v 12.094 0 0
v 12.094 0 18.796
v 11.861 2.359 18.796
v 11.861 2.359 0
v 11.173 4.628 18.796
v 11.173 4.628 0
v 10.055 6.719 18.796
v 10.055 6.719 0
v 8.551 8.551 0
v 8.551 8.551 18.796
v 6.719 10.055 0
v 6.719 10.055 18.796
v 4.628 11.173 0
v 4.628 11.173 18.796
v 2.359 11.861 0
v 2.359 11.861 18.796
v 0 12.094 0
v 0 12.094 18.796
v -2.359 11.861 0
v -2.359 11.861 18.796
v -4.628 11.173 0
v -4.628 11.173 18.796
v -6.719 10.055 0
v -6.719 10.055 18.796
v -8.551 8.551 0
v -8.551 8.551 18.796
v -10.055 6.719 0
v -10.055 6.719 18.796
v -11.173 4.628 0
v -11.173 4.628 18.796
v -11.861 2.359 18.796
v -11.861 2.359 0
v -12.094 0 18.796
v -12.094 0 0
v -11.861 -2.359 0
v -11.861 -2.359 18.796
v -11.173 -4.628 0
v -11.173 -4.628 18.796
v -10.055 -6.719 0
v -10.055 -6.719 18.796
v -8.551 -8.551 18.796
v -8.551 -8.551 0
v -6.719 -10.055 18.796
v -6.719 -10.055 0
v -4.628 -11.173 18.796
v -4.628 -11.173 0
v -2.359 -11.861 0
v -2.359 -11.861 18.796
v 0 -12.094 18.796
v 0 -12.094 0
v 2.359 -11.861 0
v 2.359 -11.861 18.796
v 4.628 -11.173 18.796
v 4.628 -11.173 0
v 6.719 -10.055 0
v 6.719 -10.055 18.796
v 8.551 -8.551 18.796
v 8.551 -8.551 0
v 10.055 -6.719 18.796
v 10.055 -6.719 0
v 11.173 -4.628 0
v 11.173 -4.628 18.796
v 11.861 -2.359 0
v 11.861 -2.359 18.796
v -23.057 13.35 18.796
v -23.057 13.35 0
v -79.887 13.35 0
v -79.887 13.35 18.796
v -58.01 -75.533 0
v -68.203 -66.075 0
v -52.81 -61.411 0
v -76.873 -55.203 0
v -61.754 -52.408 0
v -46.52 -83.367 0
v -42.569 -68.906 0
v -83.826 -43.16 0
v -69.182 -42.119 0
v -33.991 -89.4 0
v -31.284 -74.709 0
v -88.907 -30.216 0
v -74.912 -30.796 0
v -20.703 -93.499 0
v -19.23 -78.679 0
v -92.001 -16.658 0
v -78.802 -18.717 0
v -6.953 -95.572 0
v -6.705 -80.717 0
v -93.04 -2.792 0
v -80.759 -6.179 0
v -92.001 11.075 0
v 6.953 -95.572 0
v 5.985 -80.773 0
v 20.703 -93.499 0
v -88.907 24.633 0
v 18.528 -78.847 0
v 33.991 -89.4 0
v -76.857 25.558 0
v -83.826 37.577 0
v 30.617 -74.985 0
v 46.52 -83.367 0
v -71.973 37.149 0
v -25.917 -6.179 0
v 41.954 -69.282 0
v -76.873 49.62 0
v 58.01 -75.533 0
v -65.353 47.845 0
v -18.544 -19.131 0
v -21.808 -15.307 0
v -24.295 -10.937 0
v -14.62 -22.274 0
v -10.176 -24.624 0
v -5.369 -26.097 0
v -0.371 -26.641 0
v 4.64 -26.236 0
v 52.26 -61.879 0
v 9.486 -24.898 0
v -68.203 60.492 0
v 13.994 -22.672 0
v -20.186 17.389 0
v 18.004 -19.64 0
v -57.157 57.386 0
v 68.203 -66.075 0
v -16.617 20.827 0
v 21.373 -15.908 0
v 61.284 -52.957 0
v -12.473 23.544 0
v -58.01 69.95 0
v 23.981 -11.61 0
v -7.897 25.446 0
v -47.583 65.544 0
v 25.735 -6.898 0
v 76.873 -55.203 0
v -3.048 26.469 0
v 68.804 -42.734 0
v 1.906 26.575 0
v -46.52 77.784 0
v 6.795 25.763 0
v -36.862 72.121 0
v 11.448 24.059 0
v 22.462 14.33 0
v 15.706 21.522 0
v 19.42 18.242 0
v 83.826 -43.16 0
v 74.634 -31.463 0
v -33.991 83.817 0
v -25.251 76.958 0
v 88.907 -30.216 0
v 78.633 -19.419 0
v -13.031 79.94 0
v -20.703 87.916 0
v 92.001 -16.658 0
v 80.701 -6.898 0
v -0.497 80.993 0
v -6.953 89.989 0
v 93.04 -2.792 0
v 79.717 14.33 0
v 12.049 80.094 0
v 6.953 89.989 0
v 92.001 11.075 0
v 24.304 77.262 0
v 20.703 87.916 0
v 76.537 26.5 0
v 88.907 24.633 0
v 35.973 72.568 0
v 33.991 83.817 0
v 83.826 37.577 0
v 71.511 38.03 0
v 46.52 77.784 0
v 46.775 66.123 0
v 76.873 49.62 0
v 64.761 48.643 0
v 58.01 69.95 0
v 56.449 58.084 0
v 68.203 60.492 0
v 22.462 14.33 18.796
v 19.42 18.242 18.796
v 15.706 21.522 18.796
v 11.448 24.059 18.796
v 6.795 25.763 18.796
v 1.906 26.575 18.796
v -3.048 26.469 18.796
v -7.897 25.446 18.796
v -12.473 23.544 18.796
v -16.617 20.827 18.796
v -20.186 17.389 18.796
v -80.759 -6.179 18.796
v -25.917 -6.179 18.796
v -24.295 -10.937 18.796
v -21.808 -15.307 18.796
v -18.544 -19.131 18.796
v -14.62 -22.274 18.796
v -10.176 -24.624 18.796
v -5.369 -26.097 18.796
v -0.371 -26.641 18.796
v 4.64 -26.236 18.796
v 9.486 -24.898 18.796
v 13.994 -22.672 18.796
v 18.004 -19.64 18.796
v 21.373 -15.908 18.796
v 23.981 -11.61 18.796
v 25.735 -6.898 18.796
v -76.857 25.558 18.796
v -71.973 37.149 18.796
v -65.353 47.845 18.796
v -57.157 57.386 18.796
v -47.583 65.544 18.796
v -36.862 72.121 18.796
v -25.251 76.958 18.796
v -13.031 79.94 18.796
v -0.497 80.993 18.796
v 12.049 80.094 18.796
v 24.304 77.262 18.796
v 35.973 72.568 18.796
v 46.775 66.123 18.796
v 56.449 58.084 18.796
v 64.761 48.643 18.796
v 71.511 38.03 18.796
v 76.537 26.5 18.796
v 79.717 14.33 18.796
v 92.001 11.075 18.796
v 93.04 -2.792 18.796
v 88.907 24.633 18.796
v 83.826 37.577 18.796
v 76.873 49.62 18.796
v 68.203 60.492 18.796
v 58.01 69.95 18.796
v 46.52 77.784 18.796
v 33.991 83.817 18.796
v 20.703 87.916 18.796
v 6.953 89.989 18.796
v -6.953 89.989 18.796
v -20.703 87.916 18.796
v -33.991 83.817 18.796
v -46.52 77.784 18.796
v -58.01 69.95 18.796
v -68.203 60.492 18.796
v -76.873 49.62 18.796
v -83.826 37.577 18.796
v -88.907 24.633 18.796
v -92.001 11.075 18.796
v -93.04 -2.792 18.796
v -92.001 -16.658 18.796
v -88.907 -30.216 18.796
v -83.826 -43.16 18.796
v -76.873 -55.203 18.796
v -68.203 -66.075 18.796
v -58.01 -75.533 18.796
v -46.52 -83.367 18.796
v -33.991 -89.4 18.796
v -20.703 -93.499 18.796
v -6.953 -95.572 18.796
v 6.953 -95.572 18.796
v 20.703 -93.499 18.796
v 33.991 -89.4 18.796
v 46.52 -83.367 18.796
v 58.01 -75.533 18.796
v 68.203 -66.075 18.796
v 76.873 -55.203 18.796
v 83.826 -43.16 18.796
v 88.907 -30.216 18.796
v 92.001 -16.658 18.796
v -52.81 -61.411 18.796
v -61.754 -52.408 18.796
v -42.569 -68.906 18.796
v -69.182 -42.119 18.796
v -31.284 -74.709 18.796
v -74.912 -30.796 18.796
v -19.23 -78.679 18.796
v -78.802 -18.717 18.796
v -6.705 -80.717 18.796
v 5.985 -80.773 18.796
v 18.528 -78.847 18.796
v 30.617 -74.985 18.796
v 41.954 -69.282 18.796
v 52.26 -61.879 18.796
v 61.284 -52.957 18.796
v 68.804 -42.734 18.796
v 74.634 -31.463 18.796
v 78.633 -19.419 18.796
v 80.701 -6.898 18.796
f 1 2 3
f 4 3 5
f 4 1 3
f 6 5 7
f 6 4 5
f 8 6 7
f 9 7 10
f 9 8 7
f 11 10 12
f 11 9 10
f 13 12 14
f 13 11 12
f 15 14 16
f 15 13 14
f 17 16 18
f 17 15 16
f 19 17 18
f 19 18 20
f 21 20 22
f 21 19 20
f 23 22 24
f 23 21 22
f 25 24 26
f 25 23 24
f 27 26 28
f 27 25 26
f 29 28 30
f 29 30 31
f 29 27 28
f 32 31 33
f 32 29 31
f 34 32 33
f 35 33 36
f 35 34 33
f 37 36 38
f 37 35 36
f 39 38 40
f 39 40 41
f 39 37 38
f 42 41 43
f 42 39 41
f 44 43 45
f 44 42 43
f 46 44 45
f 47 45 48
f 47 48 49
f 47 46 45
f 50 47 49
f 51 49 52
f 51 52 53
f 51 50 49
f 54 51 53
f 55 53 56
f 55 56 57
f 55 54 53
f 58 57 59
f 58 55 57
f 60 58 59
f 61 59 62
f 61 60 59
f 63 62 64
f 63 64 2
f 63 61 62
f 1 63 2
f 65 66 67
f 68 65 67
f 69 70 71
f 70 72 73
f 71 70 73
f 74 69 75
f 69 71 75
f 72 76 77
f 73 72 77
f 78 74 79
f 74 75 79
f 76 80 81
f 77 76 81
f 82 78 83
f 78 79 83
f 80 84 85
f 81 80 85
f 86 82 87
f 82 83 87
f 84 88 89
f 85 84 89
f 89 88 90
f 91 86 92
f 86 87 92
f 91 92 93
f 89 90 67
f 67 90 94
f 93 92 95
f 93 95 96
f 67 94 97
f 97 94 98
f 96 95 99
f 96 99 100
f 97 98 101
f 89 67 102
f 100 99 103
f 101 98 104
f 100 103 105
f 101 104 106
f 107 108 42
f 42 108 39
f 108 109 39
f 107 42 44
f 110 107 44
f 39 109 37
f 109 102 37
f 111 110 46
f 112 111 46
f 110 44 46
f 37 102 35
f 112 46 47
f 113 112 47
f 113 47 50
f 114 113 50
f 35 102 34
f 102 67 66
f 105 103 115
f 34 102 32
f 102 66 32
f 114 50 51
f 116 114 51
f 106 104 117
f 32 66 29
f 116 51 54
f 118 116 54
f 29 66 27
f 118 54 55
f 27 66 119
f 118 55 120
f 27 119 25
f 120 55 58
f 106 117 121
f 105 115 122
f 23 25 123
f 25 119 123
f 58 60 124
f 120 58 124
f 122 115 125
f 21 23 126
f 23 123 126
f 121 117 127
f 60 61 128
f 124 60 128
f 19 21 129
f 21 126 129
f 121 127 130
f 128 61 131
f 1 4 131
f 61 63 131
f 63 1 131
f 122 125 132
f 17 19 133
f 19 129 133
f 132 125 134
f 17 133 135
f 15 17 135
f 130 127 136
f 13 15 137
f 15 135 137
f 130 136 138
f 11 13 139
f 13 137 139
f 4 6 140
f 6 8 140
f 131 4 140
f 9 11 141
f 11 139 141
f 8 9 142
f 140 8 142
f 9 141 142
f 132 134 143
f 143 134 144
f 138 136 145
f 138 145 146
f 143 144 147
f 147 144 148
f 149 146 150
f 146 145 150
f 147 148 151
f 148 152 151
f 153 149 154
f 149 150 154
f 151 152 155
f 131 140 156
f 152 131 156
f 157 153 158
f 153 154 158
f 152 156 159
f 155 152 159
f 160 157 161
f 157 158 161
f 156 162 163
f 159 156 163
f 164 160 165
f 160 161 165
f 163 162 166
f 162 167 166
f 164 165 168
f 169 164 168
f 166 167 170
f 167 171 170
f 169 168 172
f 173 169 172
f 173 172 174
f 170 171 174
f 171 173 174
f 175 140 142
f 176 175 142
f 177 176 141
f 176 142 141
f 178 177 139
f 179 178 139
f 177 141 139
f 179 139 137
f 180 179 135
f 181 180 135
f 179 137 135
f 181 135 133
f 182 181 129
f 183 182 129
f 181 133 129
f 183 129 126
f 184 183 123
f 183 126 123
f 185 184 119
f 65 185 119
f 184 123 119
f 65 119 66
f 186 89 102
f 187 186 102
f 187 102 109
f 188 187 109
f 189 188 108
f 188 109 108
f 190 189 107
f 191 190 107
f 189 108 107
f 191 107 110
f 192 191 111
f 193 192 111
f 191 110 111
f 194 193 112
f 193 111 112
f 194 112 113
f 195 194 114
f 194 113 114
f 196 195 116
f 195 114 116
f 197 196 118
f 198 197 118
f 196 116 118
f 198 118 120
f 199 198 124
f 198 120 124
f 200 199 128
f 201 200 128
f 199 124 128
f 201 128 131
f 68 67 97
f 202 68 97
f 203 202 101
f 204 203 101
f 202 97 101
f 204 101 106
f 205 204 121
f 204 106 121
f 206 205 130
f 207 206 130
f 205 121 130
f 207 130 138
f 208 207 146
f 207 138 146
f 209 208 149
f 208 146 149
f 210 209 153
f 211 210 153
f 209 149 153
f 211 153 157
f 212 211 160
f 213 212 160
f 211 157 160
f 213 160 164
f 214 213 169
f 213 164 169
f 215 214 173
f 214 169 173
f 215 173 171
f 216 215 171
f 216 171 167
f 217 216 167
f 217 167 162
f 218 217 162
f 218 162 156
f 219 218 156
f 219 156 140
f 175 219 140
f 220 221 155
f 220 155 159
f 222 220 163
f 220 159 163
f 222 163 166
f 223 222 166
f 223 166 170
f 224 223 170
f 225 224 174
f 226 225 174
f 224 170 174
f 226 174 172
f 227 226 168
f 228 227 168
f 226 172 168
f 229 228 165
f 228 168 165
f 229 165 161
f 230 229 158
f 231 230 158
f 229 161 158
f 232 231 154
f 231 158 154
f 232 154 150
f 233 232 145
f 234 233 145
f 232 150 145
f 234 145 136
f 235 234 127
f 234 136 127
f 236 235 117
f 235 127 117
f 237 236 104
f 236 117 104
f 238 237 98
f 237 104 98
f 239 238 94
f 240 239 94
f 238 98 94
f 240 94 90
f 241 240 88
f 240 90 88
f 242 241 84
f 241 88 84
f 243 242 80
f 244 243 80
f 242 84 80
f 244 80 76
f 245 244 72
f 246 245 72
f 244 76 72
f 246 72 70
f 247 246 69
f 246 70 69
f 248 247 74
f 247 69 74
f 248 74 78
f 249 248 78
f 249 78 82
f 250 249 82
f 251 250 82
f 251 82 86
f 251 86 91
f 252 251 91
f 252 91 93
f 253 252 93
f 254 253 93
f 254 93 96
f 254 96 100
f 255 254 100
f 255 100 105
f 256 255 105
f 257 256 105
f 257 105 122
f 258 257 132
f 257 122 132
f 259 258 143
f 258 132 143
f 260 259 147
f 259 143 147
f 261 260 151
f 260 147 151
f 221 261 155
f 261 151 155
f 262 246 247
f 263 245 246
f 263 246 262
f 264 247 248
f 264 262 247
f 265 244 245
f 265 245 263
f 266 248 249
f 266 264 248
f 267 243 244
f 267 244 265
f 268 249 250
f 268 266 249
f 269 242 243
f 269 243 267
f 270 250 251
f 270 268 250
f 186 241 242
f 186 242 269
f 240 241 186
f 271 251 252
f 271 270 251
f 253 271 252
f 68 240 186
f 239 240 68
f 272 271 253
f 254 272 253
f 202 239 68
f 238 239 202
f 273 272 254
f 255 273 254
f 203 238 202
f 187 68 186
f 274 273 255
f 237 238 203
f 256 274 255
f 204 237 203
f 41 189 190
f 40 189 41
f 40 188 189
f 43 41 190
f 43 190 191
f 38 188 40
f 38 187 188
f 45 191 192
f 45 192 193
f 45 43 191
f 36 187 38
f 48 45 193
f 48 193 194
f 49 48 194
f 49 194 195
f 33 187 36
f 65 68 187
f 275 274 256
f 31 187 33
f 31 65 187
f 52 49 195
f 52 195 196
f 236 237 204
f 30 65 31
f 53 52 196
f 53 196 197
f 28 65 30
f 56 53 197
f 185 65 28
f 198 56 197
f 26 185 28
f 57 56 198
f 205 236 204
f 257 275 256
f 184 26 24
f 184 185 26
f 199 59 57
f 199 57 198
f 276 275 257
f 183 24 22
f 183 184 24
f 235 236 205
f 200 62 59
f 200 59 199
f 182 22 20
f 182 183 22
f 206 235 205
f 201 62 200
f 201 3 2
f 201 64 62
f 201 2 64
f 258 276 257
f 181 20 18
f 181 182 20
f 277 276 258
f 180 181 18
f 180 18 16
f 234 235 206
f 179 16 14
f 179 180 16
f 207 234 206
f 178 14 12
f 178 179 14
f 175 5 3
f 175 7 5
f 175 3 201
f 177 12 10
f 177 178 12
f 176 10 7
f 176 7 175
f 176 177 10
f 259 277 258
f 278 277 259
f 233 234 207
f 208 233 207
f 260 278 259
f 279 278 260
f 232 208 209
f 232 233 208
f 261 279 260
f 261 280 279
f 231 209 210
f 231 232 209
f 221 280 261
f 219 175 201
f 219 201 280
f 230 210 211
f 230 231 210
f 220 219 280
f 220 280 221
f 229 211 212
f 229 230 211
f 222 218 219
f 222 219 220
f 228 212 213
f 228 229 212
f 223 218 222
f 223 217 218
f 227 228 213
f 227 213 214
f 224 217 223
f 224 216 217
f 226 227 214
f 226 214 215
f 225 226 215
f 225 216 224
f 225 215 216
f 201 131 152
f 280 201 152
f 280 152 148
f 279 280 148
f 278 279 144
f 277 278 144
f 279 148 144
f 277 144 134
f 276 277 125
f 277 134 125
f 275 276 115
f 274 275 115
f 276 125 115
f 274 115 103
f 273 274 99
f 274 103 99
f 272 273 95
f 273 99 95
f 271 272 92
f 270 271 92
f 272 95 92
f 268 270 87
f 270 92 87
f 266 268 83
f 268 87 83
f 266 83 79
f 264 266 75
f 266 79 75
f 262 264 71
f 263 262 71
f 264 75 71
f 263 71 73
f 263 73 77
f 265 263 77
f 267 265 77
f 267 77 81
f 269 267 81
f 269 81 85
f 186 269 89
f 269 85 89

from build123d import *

# Parameters (mm, degrees)
F0_R     = 93.0402692982
F0_R_2   = 20.2691960741
F0_R_3   = 12.0935741479
F1_DEPTH = 18.796


with BuildPart() as f1:
    # F0 (on Top) → F1 (new body)
    with BuildSketch(Plane.XY):
        with Locations((0, -2.7915611863)):
            Circle(F0_R)
        with BuildLine():
            ThreePointArc((-79.8869530557, 13.3503982046), (-0.497116202, 80.9932792041), (79.7170577495, 14.3300071359))
            ThreePointArc((79.7170577495, 14.3300071359), (80.674735607, 7.1934300229), (80.9948047763, 0))
            ThreePointArc((80.9948047763, 0), (80.9212005693, -3.4522020762), (80.7005217242, -6.8981297599))
            ThreePointArc((80.7005217242, -6.8981297599), (-0.3608473211, -80.9940009504), (-80.7587824796, -6.1787905904))
            ThreePointArc((-80.7587824796, -6.1787905904), (-80.9142162427, 3.6122030091), (-79.8869530557, 13.3503982046))
        make_face(mode=Mode.SUBTRACT)
        with BuildLine():
            ThreePointArc((25.7351095282, -6.8981297599), (26.4154818423, -3.4788468851), (26.6435743963, 0))
            ThreePointArc((26.6435743963, 0), (25.576764867, 7.4638566138), (22.461766451, 14.3300071359))
            ThreePointArc((22.461766451, 14.3300071359), (-0.5732574504, 26.6374066401), (-23.0574700345, 13.3503982046))
            ThreePointArc((-23.0574700345, 13.3503982046), (-26.362426228, 3.8603808085), (-25.9172259984, -6.1787905904))
            ThreePointArc((-25.9172259984, -6.1787905904), (-0.371017267, -26.6409910251), (25.7351095282, -6.8981297599))
        make_face()
        Circle(F0_R_2, mode=Mode.SUBTRACT)
        Circle(F0_R_2)
        Circle(F0_R_3, mode=Mode.SUBTRACT)
        with BuildLine():
            ThreePointArc((22.461766451, 14.3300071359), (25.576764867, 7.4638566138), (26.6435743963, 0))
            ThreePointArc((26.6435743963, 0), (26.4154818423, -3.4788468851), (25.7351095282, -6.8981297599))
            Line((25.7351095282, -6.8981297599), (80.7005217242, -6.8981297599))
            ThreePointArc((80.7005217242, -6.8981297599), (80.9212005693, -3.4522020762), (80.9948047763, 0))
            ThreePointArc((80.9948047763, 0), (80.674735607, 7.1934300229), (79.7170577495, 14.3300071359))
            Line((79.7170577495, 14.3300071359), (22.461766451, 14.3300071359))
        make_face()
        with BuildLine():
            ThreePointArc((-25.9172259984, -6.1787905904), (-26.362426228, 3.8603808085), (-23.0574700345, 13.3503982046))
            Line((-23.0574700345, 13.3503982046), (-79.8869530557, 13.3503982046))
            ThreePointArc((-79.8869530557, 13.3503982046), (-80.9142162427, 3.6122030091), (-80.7587824796, -6.1787905904))
            Line((-80.7587824796, -6.1787905904), (-25.9172259984, -6.1787905904))
        make_face()
    extrude(amount=F1_DEPTH)


solid = f1.part
